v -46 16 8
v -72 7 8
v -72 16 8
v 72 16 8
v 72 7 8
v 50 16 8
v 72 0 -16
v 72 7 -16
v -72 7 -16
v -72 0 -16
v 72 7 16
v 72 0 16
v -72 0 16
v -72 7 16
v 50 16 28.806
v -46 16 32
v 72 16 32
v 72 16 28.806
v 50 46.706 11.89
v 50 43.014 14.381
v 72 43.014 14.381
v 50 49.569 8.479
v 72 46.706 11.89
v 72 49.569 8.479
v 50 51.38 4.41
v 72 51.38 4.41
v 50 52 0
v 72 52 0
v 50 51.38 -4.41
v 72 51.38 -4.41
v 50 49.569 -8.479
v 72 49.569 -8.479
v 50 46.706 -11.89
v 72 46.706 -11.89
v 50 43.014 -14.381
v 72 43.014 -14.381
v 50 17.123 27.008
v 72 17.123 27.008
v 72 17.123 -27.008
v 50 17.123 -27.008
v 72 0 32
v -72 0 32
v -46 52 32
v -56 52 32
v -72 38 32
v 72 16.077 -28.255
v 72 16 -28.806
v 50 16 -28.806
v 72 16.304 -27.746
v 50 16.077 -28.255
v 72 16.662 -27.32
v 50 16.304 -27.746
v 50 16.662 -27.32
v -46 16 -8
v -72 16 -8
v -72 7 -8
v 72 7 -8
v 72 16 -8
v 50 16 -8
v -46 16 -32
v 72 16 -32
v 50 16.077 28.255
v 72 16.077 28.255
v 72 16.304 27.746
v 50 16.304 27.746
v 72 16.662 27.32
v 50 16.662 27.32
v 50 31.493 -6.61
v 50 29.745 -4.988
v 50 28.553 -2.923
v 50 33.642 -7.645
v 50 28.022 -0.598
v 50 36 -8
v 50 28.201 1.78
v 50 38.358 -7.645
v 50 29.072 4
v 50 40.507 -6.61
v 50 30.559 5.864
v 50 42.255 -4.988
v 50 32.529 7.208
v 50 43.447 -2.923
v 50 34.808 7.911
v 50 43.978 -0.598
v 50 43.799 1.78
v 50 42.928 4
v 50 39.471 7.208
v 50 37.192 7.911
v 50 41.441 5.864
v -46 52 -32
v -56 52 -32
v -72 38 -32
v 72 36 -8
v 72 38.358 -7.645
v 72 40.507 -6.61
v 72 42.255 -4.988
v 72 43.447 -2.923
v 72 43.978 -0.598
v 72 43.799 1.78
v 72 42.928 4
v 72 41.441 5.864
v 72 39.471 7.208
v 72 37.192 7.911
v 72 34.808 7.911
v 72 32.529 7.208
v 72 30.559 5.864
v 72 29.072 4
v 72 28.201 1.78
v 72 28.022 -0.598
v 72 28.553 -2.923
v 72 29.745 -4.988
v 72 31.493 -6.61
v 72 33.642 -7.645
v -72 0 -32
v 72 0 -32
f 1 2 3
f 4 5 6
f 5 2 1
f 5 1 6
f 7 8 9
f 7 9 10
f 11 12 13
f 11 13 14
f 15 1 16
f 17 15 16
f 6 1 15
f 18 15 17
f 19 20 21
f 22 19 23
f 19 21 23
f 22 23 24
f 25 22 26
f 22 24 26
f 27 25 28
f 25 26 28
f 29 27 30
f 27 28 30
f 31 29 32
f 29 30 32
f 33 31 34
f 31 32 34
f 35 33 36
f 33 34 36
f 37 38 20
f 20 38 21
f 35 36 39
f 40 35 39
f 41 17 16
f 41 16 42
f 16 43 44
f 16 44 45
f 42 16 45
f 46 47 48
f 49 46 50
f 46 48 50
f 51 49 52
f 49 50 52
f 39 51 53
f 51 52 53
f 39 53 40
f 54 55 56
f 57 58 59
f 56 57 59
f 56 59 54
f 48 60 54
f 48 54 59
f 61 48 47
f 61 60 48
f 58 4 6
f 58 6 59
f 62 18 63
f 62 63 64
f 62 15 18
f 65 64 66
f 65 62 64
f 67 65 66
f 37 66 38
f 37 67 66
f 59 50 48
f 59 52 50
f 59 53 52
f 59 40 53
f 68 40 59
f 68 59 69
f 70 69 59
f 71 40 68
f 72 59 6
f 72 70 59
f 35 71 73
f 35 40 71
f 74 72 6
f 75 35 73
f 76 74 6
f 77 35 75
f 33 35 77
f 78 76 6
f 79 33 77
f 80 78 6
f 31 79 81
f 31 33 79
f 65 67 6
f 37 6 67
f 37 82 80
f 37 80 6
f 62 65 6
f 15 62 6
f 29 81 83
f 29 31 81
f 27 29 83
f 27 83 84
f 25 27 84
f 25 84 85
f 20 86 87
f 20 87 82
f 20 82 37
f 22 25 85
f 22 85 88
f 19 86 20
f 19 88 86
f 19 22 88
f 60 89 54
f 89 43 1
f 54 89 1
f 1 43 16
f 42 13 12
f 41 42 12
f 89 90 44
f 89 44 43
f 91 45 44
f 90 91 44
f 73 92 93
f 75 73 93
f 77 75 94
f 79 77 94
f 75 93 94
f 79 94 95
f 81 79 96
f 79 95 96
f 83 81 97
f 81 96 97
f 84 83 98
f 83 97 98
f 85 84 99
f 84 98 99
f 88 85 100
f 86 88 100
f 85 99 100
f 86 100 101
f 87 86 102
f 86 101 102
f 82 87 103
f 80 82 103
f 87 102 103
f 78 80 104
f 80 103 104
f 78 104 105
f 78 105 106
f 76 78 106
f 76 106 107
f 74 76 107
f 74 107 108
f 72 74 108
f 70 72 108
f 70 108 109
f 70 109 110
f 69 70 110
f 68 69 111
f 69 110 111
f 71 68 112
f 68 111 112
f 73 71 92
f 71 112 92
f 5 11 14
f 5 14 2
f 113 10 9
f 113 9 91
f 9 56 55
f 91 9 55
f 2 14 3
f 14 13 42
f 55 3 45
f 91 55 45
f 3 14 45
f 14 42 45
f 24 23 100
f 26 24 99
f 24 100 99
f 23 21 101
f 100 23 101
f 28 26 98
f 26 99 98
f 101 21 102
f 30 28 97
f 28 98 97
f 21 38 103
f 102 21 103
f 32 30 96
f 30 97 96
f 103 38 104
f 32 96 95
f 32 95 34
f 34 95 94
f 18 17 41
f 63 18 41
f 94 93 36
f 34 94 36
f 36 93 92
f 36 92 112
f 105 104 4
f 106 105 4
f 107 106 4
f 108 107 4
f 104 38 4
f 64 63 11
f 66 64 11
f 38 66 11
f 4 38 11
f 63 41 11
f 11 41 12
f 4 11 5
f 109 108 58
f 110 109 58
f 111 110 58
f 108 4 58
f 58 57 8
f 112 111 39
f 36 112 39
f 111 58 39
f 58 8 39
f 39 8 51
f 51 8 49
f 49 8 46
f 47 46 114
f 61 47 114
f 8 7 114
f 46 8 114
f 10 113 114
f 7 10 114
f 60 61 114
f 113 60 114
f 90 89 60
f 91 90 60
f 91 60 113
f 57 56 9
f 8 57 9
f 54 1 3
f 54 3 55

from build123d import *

# Parameters (mm, degrees)
SKETCH1_W           = 144
SKETCH1_H           = 64
BOSS_EXTRUDE1_DEPTH = 16
BOSS_EXTRUDE2_DEPTH = 64
SKETCH3_R           = 8
BOSS_EXTRUDE3_DEPTH = 22
FILLET1_R           = 2
CUT_EXTRUDE1_DEPTH  = 157.409718368


with BuildPart() as part:
    # Sketch1 → Boss-Extrude1 (new body)
    with BuildSketch(Plane(origin=(0, 0, 0), x_dir=(1, 0, 0), z_dir=(0, 1, 0))):
        Rectangle(SKETCH1_W, SKETCH1_H)
    extrude(amount=BOSS_EXTRUDE1_DEPTH)

    # Sketch2 → Boss-Extrude2 (add)
    with BuildSketch(Plane.XY.offset(32)):
        Polygon((-72, 16), (-72, 38), (-56, 52), (-46, 52), (-46, 16), align=None)
    extrude(amount=-BOSS_EXTRUDE2_DEPTH)

    # Sketch3 → Boss-Extrude3 (add)
    with BuildSketch(Plane(origin=(72, 0, 0), x_dir=(0, 0, -1), z_dir=(1, 0, 0))):
        with BuildLine():
            Line((-27.556282819, 16), (-14.380704741, 43.013938349))
            ThreePointArc((-14.380704741, 43.013938349), (0, 52), (14.380704741, 43.013938349))
            Line((14.380704741, 43.013938349), (27.556282819, 16))
            Line((27.556282819, 16), (-27.556282819, 16))
        make_face()
        with Locations((0, 36)):
            Circle(SKETCH3_R, mode=Mode.SUBTRACT)
    extrude(amount=-BOSS_EXTRUDE3_DEPTH)

    # Fillet1
    fillet1_edges = [part.edges().sort_by_distance(p)[0] for p in [
        (61, 16, -27.556282819),
        (61, 16, 27.556282819),
    ]]
    fillet(fillet1_edges, radius=FILLET1_R)

    # Sketch4 → Cut-Extrude1 (cut, through all)
    with BuildSketch(Plane(origin=(72, 0, 0), x_dir=(0, 0, -1), z_dir=(1, 0, 0))):
        Polygon((-16, 0), (-16, 7), (-8, 7), (-8, 16), (8, 16), (8, 7), (16, 7), (16, 0), align=None)
    extrude(amount=-CUT_EXTRUDE1_DEPTH, mode=Mode.SUBTRACT)


solid = part.part
